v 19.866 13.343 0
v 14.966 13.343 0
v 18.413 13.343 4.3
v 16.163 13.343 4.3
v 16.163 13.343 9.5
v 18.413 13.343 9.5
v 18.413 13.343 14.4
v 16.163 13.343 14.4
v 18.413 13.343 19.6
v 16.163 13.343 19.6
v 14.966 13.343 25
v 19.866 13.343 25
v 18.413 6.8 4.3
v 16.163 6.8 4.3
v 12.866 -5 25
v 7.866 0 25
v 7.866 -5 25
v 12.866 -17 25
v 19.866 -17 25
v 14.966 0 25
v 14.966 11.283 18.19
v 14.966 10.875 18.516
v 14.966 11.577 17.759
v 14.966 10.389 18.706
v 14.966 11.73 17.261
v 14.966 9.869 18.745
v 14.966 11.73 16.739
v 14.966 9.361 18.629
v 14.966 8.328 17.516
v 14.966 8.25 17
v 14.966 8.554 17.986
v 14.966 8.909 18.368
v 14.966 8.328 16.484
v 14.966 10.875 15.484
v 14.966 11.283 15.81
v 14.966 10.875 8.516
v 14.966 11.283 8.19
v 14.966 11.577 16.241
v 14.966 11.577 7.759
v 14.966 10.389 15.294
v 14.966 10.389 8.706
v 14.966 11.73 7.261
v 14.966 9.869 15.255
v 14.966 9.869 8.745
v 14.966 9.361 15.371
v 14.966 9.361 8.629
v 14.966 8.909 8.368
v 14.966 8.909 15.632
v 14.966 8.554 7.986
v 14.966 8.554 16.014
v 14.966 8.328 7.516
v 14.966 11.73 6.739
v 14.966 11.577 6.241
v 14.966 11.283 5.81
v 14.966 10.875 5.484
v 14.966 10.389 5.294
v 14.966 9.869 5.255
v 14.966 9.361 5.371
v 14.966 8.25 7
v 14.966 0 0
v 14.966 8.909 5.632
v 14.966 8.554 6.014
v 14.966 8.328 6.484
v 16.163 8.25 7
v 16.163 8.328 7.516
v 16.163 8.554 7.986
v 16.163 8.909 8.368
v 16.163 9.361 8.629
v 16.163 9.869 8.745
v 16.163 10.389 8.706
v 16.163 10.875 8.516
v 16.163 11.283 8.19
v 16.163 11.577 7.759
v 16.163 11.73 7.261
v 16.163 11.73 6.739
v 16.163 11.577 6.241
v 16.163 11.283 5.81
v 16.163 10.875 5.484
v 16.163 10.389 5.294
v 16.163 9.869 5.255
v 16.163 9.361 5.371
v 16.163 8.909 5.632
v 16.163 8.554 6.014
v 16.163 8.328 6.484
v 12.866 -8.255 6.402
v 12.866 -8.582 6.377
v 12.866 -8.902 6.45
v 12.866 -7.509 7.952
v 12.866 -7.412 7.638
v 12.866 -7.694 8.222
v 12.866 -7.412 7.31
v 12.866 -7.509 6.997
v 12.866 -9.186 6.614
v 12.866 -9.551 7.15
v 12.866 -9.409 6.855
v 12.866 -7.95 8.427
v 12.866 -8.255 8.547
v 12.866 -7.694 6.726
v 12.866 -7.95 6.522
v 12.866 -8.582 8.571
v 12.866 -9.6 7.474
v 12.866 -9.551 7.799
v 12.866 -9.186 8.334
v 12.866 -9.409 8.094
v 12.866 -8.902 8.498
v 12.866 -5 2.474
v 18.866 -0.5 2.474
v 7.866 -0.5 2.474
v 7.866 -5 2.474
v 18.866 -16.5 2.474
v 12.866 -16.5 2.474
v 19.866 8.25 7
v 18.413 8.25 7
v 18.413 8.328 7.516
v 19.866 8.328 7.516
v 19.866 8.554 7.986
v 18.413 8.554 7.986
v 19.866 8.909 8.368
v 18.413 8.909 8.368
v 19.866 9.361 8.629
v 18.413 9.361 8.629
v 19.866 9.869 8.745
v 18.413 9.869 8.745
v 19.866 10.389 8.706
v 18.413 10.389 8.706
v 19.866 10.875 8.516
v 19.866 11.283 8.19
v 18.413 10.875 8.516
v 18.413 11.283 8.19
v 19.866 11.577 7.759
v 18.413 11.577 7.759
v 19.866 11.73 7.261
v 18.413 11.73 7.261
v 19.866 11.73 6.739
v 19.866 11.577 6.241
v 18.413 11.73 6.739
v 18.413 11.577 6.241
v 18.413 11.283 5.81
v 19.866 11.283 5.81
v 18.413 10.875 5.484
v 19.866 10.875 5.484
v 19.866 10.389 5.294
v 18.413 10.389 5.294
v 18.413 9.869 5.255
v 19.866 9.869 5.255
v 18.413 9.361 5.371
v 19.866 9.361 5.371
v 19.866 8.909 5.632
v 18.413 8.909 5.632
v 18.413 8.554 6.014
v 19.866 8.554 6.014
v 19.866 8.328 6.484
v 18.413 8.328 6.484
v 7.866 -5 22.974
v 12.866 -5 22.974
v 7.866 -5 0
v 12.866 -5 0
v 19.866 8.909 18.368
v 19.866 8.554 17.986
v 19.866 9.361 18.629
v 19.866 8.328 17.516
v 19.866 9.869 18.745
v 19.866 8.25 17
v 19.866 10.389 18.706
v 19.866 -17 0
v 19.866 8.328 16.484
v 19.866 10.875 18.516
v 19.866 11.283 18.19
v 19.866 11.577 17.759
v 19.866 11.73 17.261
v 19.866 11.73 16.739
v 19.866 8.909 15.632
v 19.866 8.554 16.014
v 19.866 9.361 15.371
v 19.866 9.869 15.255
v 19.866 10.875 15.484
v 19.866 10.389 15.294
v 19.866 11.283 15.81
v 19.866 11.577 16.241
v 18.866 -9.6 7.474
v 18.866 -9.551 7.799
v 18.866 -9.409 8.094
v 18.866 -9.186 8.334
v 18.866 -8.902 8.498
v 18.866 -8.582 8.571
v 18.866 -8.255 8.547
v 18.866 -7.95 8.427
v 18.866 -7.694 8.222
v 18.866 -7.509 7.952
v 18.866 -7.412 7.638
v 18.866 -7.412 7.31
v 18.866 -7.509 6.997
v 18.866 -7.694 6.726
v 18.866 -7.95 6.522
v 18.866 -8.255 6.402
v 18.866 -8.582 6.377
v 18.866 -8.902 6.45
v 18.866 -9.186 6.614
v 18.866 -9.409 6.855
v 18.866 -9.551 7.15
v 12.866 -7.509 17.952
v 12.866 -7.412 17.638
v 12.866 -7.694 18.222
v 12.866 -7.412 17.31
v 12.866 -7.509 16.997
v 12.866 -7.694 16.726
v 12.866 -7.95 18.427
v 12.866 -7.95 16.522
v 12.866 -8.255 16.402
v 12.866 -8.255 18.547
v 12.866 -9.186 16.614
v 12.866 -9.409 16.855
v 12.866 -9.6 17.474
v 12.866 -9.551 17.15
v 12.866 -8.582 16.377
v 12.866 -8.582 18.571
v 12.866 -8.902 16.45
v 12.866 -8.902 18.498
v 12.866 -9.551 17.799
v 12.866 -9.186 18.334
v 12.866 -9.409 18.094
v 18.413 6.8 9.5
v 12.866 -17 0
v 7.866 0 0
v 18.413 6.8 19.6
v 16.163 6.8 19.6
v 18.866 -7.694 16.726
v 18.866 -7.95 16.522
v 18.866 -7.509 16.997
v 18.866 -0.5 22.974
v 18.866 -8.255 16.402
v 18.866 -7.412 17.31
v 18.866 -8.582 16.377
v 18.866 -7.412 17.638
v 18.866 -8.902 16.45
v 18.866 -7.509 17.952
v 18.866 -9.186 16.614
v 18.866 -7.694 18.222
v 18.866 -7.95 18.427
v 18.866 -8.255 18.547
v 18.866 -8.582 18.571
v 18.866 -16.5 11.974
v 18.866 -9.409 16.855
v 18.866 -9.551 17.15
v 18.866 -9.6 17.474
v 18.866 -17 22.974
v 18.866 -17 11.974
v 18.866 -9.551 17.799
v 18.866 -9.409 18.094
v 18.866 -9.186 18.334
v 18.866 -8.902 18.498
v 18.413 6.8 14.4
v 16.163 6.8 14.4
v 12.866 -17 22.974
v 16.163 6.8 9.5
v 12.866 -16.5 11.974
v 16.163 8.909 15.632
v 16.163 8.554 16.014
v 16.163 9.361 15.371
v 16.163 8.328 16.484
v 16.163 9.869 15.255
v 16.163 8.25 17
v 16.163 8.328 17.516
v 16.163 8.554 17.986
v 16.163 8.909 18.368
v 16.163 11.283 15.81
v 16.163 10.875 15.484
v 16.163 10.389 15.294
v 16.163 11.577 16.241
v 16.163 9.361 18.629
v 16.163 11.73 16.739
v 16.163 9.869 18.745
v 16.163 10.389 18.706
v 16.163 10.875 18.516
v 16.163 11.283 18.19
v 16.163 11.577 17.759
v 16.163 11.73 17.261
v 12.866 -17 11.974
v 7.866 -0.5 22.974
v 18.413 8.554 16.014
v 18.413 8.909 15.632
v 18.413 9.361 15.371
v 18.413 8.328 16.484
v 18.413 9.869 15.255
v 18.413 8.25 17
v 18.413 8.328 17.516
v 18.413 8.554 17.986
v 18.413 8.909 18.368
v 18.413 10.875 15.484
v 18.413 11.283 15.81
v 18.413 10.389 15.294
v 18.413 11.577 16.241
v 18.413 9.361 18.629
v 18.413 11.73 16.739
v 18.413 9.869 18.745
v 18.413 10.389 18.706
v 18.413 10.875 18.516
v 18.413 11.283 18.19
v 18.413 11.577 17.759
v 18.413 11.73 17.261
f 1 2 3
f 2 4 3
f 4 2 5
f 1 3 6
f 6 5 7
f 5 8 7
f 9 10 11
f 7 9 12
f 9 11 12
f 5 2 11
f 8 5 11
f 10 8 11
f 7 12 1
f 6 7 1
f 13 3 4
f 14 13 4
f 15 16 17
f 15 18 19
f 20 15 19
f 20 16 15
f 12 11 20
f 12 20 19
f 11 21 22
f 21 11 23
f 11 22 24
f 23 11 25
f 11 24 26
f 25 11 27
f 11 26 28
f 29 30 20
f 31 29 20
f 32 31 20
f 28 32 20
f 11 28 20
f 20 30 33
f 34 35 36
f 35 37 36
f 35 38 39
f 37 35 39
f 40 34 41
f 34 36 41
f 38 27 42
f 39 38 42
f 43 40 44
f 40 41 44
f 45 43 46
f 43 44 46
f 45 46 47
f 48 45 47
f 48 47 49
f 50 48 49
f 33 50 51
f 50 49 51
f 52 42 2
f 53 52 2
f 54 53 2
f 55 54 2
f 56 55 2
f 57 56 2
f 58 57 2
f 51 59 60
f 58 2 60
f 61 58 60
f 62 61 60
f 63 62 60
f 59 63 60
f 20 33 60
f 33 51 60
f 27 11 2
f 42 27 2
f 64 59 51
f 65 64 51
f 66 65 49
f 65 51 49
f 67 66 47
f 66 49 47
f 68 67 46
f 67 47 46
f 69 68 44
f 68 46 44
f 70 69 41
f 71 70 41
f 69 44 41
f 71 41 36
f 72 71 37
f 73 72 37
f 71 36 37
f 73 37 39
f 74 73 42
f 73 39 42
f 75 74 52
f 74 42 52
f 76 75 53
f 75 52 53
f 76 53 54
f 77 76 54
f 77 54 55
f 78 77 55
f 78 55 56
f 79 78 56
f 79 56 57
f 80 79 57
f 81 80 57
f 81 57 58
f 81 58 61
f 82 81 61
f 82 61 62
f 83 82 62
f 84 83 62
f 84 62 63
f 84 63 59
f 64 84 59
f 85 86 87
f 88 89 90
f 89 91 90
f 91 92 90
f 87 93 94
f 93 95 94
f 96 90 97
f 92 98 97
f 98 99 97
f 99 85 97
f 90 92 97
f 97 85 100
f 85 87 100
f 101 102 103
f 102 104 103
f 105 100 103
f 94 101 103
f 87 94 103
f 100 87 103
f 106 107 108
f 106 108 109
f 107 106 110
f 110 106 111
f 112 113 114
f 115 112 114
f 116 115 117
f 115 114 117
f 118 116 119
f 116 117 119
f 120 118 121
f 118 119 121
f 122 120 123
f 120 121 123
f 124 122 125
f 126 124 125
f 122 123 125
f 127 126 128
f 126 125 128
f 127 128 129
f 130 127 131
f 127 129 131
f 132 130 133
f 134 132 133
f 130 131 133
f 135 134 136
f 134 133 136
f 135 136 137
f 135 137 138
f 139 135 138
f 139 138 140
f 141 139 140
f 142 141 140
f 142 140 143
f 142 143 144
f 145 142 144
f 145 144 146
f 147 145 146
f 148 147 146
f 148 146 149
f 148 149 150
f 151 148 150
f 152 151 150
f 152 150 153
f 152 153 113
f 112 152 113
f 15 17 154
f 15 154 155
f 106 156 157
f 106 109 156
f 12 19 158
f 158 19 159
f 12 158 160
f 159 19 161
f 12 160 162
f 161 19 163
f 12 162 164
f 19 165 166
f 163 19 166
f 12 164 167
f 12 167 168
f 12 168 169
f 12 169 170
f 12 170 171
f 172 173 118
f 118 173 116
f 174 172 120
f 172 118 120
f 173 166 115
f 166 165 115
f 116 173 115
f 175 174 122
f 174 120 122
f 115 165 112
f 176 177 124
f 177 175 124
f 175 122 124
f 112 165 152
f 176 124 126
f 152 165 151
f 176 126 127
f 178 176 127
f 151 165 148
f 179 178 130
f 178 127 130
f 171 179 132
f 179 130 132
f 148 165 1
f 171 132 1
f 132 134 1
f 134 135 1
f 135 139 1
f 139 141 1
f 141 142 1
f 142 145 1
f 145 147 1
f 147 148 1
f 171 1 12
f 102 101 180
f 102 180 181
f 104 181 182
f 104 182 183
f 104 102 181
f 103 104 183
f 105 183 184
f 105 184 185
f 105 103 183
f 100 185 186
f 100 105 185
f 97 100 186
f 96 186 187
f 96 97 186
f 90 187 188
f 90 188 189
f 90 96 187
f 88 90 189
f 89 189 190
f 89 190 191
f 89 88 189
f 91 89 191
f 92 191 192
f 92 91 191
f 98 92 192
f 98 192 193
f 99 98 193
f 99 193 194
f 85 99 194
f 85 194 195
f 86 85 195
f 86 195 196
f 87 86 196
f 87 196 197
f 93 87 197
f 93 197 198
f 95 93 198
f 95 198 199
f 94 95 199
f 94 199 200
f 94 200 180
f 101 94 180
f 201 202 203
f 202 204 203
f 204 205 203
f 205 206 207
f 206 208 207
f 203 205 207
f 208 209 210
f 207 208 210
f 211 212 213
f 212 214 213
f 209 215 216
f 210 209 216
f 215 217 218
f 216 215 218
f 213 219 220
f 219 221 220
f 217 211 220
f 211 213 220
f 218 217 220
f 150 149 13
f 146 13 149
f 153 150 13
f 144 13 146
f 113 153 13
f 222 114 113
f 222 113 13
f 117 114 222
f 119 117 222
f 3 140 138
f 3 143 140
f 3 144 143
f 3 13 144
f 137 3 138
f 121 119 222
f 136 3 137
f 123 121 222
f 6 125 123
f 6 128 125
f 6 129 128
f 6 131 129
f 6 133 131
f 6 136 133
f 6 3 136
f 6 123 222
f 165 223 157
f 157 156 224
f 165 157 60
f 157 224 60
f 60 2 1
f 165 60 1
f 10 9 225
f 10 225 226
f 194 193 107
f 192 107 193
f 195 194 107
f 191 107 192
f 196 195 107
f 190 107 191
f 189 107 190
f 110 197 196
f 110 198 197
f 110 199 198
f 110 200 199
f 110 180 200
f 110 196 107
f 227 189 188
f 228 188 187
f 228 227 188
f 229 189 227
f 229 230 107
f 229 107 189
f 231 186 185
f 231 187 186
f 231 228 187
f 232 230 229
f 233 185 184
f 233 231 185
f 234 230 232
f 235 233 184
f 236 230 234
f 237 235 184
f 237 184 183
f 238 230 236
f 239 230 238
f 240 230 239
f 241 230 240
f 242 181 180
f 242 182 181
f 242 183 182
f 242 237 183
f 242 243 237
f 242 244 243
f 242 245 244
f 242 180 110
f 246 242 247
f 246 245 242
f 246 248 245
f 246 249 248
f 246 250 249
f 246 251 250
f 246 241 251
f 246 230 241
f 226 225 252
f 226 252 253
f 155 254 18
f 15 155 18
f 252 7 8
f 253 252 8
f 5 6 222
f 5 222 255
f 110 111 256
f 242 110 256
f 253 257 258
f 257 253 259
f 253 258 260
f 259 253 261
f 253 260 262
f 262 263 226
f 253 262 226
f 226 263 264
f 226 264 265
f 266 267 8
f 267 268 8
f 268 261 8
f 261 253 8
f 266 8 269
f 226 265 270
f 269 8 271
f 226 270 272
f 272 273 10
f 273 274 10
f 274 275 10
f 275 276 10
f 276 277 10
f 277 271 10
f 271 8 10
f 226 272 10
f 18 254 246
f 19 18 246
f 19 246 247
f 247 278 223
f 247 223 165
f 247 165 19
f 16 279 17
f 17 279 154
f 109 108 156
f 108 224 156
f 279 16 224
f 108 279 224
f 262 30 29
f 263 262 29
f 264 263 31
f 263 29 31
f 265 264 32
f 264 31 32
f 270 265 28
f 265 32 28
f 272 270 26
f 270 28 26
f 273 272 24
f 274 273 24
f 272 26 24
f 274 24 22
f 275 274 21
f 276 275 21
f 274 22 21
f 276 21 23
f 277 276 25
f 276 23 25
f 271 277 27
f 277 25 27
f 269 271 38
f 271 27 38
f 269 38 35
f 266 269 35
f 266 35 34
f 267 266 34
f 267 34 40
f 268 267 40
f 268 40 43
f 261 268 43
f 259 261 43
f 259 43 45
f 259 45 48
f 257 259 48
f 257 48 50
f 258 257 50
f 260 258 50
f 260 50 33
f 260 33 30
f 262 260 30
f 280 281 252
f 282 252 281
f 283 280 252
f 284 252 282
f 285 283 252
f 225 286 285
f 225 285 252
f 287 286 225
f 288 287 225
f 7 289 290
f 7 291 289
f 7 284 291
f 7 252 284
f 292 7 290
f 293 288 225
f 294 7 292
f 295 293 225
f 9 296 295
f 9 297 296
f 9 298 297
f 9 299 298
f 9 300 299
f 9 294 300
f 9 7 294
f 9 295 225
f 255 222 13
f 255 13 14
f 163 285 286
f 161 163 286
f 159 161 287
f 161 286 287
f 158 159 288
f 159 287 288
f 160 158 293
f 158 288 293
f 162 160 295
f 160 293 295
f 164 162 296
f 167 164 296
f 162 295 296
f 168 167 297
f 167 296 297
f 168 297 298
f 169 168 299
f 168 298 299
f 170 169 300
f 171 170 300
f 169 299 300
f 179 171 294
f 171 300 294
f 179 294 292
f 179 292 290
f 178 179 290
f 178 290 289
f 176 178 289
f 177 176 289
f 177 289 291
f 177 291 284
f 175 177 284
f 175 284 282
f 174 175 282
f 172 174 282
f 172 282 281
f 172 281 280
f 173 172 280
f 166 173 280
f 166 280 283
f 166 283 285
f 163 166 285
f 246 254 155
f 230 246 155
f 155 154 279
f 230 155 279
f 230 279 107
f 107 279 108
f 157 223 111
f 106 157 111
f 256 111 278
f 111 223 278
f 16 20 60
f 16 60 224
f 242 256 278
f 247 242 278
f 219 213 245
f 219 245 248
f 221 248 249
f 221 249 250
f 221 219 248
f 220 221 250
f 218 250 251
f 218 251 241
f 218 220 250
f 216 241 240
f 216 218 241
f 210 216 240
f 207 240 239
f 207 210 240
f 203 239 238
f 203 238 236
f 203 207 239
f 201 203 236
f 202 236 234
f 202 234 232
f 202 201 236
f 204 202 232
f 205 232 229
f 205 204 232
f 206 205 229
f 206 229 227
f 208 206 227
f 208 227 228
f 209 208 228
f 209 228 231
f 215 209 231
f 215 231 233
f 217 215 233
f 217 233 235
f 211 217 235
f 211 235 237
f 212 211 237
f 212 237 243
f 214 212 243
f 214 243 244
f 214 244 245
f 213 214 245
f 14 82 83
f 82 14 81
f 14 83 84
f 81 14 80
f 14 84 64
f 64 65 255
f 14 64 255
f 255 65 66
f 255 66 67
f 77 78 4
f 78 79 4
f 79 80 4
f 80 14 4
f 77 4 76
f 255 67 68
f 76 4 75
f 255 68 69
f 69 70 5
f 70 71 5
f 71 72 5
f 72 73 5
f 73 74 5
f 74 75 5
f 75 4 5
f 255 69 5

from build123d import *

# Parameters (mm, degrees)
F1_DEPTH  = 25
F2_R      = 1.75
F3_DEPTH  = 12.001
F4_W      = 2.25
F4_H      = 5.2
F5_DEPTH  = 8.2
F6_W      = 6.7676874548
F6_H      = 2
F6_W_2    = 4.3625808284
F6_H_2    = 16.5741704404
F7_DEPTH  = 25.001
F8_R      = 1.1
F9_DEPTH  = 11
F10_W     = 7.5431205352
F10_H     = 29.8151662209
F11_DEPTH = 12


with BuildPart() as f1:
    # F0 (on Top) → F1 (new body)
    with BuildSketch(Plane.XY):
        Polygon((11.3658751324, 15), (7.8658751324, 15), (7.8658751324, -17), (19.8658751324, -17), (19.8658751324, 15), (14.9658751324, 15), (14.9658751324, 0), (11.3658751324, 0), align=None)
    extrude(amount=F1_DEPTH)

    # F2 (on face) → F3 (cut, through all)
    with BuildSketch(Plane(origin=(7.8658751324, 0, 0), x_dir=(0, -1, 0), z_dir=(-1, 0, 0))):
        with Locations((-10, 17)):
            Circle(F2_R)
        with Locations((-10, 7)):
            Circle(F2_R)
    extrude(amount=-F3_DEPTH, mode=Mode.SUBTRACT)

    # F4 (on face) → F5 (cut)
    with BuildSketch(Plane(origin=(0, 15, 0), x_dir=(-1, 0, 0), z_dir=(0, 1, 0))):
        with Locations((-17.2876401603, 17)):
            Rectangle(F4_W, F4_H)
        with Locations((-17.2876401603, 6.9)):
            Rectangle(F4_W, F4_H)
    extrude(amount=-F5_DEPTH, mode=Mode.SUBTRACT)

    # F6 (on face) → F7 (cut, through all)
    with BuildSketch(Plane.XY.offset(25)):
        with Locations((17.0719223097, 14.3433604389)):
            Rectangle(F6_W, F6_H)
        with Locations((9.1845847182, 8.2870852202)):
            Rectangle(F6_W_2, F6_H_2)
    extrude(amount=-F7_DEPTH, mode=Mode.SUBTRACT)

    # F8 (on face) → F9 (cut)
    with BuildSketch(Plane(origin=(7.8658751324, 0, 0), x_dir=(0, -1, 0), z_dir=(-1, 0, 0))):
        Polygon((16.5, 22.9742758833), (0.5, 22.9742758833), (0.5, 2.4742758833), (16.5, 2.4742758833), (16.5, 11.9742758833), (19.0740358084, 11.9742758833), (19.0740358084, 22.9742758833), align=None)
        with Locations((8.5, 7.4742758833)):
            Circle(F8_R, mode=Mode.SUBTRACT)
        with Locations((8.5, 17.4742758833)):
            Circle(F8_R, mode=Mode.SUBTRACT)
    extrude(amount=-F9_DEPTH, mode=Mode.SUBTRACT)

    # F10 (on face) → F11 (cut)
    with BuildSketch(Plane.XZ.offset(17)):
        with Locations((9.0943148648, 13.0673133535)):
            Rectangle(F10_W, F10_H)
    extrude(amount=-F11_DEPTH, mode=Mode.SUBTRACT)


solid = f1.part
